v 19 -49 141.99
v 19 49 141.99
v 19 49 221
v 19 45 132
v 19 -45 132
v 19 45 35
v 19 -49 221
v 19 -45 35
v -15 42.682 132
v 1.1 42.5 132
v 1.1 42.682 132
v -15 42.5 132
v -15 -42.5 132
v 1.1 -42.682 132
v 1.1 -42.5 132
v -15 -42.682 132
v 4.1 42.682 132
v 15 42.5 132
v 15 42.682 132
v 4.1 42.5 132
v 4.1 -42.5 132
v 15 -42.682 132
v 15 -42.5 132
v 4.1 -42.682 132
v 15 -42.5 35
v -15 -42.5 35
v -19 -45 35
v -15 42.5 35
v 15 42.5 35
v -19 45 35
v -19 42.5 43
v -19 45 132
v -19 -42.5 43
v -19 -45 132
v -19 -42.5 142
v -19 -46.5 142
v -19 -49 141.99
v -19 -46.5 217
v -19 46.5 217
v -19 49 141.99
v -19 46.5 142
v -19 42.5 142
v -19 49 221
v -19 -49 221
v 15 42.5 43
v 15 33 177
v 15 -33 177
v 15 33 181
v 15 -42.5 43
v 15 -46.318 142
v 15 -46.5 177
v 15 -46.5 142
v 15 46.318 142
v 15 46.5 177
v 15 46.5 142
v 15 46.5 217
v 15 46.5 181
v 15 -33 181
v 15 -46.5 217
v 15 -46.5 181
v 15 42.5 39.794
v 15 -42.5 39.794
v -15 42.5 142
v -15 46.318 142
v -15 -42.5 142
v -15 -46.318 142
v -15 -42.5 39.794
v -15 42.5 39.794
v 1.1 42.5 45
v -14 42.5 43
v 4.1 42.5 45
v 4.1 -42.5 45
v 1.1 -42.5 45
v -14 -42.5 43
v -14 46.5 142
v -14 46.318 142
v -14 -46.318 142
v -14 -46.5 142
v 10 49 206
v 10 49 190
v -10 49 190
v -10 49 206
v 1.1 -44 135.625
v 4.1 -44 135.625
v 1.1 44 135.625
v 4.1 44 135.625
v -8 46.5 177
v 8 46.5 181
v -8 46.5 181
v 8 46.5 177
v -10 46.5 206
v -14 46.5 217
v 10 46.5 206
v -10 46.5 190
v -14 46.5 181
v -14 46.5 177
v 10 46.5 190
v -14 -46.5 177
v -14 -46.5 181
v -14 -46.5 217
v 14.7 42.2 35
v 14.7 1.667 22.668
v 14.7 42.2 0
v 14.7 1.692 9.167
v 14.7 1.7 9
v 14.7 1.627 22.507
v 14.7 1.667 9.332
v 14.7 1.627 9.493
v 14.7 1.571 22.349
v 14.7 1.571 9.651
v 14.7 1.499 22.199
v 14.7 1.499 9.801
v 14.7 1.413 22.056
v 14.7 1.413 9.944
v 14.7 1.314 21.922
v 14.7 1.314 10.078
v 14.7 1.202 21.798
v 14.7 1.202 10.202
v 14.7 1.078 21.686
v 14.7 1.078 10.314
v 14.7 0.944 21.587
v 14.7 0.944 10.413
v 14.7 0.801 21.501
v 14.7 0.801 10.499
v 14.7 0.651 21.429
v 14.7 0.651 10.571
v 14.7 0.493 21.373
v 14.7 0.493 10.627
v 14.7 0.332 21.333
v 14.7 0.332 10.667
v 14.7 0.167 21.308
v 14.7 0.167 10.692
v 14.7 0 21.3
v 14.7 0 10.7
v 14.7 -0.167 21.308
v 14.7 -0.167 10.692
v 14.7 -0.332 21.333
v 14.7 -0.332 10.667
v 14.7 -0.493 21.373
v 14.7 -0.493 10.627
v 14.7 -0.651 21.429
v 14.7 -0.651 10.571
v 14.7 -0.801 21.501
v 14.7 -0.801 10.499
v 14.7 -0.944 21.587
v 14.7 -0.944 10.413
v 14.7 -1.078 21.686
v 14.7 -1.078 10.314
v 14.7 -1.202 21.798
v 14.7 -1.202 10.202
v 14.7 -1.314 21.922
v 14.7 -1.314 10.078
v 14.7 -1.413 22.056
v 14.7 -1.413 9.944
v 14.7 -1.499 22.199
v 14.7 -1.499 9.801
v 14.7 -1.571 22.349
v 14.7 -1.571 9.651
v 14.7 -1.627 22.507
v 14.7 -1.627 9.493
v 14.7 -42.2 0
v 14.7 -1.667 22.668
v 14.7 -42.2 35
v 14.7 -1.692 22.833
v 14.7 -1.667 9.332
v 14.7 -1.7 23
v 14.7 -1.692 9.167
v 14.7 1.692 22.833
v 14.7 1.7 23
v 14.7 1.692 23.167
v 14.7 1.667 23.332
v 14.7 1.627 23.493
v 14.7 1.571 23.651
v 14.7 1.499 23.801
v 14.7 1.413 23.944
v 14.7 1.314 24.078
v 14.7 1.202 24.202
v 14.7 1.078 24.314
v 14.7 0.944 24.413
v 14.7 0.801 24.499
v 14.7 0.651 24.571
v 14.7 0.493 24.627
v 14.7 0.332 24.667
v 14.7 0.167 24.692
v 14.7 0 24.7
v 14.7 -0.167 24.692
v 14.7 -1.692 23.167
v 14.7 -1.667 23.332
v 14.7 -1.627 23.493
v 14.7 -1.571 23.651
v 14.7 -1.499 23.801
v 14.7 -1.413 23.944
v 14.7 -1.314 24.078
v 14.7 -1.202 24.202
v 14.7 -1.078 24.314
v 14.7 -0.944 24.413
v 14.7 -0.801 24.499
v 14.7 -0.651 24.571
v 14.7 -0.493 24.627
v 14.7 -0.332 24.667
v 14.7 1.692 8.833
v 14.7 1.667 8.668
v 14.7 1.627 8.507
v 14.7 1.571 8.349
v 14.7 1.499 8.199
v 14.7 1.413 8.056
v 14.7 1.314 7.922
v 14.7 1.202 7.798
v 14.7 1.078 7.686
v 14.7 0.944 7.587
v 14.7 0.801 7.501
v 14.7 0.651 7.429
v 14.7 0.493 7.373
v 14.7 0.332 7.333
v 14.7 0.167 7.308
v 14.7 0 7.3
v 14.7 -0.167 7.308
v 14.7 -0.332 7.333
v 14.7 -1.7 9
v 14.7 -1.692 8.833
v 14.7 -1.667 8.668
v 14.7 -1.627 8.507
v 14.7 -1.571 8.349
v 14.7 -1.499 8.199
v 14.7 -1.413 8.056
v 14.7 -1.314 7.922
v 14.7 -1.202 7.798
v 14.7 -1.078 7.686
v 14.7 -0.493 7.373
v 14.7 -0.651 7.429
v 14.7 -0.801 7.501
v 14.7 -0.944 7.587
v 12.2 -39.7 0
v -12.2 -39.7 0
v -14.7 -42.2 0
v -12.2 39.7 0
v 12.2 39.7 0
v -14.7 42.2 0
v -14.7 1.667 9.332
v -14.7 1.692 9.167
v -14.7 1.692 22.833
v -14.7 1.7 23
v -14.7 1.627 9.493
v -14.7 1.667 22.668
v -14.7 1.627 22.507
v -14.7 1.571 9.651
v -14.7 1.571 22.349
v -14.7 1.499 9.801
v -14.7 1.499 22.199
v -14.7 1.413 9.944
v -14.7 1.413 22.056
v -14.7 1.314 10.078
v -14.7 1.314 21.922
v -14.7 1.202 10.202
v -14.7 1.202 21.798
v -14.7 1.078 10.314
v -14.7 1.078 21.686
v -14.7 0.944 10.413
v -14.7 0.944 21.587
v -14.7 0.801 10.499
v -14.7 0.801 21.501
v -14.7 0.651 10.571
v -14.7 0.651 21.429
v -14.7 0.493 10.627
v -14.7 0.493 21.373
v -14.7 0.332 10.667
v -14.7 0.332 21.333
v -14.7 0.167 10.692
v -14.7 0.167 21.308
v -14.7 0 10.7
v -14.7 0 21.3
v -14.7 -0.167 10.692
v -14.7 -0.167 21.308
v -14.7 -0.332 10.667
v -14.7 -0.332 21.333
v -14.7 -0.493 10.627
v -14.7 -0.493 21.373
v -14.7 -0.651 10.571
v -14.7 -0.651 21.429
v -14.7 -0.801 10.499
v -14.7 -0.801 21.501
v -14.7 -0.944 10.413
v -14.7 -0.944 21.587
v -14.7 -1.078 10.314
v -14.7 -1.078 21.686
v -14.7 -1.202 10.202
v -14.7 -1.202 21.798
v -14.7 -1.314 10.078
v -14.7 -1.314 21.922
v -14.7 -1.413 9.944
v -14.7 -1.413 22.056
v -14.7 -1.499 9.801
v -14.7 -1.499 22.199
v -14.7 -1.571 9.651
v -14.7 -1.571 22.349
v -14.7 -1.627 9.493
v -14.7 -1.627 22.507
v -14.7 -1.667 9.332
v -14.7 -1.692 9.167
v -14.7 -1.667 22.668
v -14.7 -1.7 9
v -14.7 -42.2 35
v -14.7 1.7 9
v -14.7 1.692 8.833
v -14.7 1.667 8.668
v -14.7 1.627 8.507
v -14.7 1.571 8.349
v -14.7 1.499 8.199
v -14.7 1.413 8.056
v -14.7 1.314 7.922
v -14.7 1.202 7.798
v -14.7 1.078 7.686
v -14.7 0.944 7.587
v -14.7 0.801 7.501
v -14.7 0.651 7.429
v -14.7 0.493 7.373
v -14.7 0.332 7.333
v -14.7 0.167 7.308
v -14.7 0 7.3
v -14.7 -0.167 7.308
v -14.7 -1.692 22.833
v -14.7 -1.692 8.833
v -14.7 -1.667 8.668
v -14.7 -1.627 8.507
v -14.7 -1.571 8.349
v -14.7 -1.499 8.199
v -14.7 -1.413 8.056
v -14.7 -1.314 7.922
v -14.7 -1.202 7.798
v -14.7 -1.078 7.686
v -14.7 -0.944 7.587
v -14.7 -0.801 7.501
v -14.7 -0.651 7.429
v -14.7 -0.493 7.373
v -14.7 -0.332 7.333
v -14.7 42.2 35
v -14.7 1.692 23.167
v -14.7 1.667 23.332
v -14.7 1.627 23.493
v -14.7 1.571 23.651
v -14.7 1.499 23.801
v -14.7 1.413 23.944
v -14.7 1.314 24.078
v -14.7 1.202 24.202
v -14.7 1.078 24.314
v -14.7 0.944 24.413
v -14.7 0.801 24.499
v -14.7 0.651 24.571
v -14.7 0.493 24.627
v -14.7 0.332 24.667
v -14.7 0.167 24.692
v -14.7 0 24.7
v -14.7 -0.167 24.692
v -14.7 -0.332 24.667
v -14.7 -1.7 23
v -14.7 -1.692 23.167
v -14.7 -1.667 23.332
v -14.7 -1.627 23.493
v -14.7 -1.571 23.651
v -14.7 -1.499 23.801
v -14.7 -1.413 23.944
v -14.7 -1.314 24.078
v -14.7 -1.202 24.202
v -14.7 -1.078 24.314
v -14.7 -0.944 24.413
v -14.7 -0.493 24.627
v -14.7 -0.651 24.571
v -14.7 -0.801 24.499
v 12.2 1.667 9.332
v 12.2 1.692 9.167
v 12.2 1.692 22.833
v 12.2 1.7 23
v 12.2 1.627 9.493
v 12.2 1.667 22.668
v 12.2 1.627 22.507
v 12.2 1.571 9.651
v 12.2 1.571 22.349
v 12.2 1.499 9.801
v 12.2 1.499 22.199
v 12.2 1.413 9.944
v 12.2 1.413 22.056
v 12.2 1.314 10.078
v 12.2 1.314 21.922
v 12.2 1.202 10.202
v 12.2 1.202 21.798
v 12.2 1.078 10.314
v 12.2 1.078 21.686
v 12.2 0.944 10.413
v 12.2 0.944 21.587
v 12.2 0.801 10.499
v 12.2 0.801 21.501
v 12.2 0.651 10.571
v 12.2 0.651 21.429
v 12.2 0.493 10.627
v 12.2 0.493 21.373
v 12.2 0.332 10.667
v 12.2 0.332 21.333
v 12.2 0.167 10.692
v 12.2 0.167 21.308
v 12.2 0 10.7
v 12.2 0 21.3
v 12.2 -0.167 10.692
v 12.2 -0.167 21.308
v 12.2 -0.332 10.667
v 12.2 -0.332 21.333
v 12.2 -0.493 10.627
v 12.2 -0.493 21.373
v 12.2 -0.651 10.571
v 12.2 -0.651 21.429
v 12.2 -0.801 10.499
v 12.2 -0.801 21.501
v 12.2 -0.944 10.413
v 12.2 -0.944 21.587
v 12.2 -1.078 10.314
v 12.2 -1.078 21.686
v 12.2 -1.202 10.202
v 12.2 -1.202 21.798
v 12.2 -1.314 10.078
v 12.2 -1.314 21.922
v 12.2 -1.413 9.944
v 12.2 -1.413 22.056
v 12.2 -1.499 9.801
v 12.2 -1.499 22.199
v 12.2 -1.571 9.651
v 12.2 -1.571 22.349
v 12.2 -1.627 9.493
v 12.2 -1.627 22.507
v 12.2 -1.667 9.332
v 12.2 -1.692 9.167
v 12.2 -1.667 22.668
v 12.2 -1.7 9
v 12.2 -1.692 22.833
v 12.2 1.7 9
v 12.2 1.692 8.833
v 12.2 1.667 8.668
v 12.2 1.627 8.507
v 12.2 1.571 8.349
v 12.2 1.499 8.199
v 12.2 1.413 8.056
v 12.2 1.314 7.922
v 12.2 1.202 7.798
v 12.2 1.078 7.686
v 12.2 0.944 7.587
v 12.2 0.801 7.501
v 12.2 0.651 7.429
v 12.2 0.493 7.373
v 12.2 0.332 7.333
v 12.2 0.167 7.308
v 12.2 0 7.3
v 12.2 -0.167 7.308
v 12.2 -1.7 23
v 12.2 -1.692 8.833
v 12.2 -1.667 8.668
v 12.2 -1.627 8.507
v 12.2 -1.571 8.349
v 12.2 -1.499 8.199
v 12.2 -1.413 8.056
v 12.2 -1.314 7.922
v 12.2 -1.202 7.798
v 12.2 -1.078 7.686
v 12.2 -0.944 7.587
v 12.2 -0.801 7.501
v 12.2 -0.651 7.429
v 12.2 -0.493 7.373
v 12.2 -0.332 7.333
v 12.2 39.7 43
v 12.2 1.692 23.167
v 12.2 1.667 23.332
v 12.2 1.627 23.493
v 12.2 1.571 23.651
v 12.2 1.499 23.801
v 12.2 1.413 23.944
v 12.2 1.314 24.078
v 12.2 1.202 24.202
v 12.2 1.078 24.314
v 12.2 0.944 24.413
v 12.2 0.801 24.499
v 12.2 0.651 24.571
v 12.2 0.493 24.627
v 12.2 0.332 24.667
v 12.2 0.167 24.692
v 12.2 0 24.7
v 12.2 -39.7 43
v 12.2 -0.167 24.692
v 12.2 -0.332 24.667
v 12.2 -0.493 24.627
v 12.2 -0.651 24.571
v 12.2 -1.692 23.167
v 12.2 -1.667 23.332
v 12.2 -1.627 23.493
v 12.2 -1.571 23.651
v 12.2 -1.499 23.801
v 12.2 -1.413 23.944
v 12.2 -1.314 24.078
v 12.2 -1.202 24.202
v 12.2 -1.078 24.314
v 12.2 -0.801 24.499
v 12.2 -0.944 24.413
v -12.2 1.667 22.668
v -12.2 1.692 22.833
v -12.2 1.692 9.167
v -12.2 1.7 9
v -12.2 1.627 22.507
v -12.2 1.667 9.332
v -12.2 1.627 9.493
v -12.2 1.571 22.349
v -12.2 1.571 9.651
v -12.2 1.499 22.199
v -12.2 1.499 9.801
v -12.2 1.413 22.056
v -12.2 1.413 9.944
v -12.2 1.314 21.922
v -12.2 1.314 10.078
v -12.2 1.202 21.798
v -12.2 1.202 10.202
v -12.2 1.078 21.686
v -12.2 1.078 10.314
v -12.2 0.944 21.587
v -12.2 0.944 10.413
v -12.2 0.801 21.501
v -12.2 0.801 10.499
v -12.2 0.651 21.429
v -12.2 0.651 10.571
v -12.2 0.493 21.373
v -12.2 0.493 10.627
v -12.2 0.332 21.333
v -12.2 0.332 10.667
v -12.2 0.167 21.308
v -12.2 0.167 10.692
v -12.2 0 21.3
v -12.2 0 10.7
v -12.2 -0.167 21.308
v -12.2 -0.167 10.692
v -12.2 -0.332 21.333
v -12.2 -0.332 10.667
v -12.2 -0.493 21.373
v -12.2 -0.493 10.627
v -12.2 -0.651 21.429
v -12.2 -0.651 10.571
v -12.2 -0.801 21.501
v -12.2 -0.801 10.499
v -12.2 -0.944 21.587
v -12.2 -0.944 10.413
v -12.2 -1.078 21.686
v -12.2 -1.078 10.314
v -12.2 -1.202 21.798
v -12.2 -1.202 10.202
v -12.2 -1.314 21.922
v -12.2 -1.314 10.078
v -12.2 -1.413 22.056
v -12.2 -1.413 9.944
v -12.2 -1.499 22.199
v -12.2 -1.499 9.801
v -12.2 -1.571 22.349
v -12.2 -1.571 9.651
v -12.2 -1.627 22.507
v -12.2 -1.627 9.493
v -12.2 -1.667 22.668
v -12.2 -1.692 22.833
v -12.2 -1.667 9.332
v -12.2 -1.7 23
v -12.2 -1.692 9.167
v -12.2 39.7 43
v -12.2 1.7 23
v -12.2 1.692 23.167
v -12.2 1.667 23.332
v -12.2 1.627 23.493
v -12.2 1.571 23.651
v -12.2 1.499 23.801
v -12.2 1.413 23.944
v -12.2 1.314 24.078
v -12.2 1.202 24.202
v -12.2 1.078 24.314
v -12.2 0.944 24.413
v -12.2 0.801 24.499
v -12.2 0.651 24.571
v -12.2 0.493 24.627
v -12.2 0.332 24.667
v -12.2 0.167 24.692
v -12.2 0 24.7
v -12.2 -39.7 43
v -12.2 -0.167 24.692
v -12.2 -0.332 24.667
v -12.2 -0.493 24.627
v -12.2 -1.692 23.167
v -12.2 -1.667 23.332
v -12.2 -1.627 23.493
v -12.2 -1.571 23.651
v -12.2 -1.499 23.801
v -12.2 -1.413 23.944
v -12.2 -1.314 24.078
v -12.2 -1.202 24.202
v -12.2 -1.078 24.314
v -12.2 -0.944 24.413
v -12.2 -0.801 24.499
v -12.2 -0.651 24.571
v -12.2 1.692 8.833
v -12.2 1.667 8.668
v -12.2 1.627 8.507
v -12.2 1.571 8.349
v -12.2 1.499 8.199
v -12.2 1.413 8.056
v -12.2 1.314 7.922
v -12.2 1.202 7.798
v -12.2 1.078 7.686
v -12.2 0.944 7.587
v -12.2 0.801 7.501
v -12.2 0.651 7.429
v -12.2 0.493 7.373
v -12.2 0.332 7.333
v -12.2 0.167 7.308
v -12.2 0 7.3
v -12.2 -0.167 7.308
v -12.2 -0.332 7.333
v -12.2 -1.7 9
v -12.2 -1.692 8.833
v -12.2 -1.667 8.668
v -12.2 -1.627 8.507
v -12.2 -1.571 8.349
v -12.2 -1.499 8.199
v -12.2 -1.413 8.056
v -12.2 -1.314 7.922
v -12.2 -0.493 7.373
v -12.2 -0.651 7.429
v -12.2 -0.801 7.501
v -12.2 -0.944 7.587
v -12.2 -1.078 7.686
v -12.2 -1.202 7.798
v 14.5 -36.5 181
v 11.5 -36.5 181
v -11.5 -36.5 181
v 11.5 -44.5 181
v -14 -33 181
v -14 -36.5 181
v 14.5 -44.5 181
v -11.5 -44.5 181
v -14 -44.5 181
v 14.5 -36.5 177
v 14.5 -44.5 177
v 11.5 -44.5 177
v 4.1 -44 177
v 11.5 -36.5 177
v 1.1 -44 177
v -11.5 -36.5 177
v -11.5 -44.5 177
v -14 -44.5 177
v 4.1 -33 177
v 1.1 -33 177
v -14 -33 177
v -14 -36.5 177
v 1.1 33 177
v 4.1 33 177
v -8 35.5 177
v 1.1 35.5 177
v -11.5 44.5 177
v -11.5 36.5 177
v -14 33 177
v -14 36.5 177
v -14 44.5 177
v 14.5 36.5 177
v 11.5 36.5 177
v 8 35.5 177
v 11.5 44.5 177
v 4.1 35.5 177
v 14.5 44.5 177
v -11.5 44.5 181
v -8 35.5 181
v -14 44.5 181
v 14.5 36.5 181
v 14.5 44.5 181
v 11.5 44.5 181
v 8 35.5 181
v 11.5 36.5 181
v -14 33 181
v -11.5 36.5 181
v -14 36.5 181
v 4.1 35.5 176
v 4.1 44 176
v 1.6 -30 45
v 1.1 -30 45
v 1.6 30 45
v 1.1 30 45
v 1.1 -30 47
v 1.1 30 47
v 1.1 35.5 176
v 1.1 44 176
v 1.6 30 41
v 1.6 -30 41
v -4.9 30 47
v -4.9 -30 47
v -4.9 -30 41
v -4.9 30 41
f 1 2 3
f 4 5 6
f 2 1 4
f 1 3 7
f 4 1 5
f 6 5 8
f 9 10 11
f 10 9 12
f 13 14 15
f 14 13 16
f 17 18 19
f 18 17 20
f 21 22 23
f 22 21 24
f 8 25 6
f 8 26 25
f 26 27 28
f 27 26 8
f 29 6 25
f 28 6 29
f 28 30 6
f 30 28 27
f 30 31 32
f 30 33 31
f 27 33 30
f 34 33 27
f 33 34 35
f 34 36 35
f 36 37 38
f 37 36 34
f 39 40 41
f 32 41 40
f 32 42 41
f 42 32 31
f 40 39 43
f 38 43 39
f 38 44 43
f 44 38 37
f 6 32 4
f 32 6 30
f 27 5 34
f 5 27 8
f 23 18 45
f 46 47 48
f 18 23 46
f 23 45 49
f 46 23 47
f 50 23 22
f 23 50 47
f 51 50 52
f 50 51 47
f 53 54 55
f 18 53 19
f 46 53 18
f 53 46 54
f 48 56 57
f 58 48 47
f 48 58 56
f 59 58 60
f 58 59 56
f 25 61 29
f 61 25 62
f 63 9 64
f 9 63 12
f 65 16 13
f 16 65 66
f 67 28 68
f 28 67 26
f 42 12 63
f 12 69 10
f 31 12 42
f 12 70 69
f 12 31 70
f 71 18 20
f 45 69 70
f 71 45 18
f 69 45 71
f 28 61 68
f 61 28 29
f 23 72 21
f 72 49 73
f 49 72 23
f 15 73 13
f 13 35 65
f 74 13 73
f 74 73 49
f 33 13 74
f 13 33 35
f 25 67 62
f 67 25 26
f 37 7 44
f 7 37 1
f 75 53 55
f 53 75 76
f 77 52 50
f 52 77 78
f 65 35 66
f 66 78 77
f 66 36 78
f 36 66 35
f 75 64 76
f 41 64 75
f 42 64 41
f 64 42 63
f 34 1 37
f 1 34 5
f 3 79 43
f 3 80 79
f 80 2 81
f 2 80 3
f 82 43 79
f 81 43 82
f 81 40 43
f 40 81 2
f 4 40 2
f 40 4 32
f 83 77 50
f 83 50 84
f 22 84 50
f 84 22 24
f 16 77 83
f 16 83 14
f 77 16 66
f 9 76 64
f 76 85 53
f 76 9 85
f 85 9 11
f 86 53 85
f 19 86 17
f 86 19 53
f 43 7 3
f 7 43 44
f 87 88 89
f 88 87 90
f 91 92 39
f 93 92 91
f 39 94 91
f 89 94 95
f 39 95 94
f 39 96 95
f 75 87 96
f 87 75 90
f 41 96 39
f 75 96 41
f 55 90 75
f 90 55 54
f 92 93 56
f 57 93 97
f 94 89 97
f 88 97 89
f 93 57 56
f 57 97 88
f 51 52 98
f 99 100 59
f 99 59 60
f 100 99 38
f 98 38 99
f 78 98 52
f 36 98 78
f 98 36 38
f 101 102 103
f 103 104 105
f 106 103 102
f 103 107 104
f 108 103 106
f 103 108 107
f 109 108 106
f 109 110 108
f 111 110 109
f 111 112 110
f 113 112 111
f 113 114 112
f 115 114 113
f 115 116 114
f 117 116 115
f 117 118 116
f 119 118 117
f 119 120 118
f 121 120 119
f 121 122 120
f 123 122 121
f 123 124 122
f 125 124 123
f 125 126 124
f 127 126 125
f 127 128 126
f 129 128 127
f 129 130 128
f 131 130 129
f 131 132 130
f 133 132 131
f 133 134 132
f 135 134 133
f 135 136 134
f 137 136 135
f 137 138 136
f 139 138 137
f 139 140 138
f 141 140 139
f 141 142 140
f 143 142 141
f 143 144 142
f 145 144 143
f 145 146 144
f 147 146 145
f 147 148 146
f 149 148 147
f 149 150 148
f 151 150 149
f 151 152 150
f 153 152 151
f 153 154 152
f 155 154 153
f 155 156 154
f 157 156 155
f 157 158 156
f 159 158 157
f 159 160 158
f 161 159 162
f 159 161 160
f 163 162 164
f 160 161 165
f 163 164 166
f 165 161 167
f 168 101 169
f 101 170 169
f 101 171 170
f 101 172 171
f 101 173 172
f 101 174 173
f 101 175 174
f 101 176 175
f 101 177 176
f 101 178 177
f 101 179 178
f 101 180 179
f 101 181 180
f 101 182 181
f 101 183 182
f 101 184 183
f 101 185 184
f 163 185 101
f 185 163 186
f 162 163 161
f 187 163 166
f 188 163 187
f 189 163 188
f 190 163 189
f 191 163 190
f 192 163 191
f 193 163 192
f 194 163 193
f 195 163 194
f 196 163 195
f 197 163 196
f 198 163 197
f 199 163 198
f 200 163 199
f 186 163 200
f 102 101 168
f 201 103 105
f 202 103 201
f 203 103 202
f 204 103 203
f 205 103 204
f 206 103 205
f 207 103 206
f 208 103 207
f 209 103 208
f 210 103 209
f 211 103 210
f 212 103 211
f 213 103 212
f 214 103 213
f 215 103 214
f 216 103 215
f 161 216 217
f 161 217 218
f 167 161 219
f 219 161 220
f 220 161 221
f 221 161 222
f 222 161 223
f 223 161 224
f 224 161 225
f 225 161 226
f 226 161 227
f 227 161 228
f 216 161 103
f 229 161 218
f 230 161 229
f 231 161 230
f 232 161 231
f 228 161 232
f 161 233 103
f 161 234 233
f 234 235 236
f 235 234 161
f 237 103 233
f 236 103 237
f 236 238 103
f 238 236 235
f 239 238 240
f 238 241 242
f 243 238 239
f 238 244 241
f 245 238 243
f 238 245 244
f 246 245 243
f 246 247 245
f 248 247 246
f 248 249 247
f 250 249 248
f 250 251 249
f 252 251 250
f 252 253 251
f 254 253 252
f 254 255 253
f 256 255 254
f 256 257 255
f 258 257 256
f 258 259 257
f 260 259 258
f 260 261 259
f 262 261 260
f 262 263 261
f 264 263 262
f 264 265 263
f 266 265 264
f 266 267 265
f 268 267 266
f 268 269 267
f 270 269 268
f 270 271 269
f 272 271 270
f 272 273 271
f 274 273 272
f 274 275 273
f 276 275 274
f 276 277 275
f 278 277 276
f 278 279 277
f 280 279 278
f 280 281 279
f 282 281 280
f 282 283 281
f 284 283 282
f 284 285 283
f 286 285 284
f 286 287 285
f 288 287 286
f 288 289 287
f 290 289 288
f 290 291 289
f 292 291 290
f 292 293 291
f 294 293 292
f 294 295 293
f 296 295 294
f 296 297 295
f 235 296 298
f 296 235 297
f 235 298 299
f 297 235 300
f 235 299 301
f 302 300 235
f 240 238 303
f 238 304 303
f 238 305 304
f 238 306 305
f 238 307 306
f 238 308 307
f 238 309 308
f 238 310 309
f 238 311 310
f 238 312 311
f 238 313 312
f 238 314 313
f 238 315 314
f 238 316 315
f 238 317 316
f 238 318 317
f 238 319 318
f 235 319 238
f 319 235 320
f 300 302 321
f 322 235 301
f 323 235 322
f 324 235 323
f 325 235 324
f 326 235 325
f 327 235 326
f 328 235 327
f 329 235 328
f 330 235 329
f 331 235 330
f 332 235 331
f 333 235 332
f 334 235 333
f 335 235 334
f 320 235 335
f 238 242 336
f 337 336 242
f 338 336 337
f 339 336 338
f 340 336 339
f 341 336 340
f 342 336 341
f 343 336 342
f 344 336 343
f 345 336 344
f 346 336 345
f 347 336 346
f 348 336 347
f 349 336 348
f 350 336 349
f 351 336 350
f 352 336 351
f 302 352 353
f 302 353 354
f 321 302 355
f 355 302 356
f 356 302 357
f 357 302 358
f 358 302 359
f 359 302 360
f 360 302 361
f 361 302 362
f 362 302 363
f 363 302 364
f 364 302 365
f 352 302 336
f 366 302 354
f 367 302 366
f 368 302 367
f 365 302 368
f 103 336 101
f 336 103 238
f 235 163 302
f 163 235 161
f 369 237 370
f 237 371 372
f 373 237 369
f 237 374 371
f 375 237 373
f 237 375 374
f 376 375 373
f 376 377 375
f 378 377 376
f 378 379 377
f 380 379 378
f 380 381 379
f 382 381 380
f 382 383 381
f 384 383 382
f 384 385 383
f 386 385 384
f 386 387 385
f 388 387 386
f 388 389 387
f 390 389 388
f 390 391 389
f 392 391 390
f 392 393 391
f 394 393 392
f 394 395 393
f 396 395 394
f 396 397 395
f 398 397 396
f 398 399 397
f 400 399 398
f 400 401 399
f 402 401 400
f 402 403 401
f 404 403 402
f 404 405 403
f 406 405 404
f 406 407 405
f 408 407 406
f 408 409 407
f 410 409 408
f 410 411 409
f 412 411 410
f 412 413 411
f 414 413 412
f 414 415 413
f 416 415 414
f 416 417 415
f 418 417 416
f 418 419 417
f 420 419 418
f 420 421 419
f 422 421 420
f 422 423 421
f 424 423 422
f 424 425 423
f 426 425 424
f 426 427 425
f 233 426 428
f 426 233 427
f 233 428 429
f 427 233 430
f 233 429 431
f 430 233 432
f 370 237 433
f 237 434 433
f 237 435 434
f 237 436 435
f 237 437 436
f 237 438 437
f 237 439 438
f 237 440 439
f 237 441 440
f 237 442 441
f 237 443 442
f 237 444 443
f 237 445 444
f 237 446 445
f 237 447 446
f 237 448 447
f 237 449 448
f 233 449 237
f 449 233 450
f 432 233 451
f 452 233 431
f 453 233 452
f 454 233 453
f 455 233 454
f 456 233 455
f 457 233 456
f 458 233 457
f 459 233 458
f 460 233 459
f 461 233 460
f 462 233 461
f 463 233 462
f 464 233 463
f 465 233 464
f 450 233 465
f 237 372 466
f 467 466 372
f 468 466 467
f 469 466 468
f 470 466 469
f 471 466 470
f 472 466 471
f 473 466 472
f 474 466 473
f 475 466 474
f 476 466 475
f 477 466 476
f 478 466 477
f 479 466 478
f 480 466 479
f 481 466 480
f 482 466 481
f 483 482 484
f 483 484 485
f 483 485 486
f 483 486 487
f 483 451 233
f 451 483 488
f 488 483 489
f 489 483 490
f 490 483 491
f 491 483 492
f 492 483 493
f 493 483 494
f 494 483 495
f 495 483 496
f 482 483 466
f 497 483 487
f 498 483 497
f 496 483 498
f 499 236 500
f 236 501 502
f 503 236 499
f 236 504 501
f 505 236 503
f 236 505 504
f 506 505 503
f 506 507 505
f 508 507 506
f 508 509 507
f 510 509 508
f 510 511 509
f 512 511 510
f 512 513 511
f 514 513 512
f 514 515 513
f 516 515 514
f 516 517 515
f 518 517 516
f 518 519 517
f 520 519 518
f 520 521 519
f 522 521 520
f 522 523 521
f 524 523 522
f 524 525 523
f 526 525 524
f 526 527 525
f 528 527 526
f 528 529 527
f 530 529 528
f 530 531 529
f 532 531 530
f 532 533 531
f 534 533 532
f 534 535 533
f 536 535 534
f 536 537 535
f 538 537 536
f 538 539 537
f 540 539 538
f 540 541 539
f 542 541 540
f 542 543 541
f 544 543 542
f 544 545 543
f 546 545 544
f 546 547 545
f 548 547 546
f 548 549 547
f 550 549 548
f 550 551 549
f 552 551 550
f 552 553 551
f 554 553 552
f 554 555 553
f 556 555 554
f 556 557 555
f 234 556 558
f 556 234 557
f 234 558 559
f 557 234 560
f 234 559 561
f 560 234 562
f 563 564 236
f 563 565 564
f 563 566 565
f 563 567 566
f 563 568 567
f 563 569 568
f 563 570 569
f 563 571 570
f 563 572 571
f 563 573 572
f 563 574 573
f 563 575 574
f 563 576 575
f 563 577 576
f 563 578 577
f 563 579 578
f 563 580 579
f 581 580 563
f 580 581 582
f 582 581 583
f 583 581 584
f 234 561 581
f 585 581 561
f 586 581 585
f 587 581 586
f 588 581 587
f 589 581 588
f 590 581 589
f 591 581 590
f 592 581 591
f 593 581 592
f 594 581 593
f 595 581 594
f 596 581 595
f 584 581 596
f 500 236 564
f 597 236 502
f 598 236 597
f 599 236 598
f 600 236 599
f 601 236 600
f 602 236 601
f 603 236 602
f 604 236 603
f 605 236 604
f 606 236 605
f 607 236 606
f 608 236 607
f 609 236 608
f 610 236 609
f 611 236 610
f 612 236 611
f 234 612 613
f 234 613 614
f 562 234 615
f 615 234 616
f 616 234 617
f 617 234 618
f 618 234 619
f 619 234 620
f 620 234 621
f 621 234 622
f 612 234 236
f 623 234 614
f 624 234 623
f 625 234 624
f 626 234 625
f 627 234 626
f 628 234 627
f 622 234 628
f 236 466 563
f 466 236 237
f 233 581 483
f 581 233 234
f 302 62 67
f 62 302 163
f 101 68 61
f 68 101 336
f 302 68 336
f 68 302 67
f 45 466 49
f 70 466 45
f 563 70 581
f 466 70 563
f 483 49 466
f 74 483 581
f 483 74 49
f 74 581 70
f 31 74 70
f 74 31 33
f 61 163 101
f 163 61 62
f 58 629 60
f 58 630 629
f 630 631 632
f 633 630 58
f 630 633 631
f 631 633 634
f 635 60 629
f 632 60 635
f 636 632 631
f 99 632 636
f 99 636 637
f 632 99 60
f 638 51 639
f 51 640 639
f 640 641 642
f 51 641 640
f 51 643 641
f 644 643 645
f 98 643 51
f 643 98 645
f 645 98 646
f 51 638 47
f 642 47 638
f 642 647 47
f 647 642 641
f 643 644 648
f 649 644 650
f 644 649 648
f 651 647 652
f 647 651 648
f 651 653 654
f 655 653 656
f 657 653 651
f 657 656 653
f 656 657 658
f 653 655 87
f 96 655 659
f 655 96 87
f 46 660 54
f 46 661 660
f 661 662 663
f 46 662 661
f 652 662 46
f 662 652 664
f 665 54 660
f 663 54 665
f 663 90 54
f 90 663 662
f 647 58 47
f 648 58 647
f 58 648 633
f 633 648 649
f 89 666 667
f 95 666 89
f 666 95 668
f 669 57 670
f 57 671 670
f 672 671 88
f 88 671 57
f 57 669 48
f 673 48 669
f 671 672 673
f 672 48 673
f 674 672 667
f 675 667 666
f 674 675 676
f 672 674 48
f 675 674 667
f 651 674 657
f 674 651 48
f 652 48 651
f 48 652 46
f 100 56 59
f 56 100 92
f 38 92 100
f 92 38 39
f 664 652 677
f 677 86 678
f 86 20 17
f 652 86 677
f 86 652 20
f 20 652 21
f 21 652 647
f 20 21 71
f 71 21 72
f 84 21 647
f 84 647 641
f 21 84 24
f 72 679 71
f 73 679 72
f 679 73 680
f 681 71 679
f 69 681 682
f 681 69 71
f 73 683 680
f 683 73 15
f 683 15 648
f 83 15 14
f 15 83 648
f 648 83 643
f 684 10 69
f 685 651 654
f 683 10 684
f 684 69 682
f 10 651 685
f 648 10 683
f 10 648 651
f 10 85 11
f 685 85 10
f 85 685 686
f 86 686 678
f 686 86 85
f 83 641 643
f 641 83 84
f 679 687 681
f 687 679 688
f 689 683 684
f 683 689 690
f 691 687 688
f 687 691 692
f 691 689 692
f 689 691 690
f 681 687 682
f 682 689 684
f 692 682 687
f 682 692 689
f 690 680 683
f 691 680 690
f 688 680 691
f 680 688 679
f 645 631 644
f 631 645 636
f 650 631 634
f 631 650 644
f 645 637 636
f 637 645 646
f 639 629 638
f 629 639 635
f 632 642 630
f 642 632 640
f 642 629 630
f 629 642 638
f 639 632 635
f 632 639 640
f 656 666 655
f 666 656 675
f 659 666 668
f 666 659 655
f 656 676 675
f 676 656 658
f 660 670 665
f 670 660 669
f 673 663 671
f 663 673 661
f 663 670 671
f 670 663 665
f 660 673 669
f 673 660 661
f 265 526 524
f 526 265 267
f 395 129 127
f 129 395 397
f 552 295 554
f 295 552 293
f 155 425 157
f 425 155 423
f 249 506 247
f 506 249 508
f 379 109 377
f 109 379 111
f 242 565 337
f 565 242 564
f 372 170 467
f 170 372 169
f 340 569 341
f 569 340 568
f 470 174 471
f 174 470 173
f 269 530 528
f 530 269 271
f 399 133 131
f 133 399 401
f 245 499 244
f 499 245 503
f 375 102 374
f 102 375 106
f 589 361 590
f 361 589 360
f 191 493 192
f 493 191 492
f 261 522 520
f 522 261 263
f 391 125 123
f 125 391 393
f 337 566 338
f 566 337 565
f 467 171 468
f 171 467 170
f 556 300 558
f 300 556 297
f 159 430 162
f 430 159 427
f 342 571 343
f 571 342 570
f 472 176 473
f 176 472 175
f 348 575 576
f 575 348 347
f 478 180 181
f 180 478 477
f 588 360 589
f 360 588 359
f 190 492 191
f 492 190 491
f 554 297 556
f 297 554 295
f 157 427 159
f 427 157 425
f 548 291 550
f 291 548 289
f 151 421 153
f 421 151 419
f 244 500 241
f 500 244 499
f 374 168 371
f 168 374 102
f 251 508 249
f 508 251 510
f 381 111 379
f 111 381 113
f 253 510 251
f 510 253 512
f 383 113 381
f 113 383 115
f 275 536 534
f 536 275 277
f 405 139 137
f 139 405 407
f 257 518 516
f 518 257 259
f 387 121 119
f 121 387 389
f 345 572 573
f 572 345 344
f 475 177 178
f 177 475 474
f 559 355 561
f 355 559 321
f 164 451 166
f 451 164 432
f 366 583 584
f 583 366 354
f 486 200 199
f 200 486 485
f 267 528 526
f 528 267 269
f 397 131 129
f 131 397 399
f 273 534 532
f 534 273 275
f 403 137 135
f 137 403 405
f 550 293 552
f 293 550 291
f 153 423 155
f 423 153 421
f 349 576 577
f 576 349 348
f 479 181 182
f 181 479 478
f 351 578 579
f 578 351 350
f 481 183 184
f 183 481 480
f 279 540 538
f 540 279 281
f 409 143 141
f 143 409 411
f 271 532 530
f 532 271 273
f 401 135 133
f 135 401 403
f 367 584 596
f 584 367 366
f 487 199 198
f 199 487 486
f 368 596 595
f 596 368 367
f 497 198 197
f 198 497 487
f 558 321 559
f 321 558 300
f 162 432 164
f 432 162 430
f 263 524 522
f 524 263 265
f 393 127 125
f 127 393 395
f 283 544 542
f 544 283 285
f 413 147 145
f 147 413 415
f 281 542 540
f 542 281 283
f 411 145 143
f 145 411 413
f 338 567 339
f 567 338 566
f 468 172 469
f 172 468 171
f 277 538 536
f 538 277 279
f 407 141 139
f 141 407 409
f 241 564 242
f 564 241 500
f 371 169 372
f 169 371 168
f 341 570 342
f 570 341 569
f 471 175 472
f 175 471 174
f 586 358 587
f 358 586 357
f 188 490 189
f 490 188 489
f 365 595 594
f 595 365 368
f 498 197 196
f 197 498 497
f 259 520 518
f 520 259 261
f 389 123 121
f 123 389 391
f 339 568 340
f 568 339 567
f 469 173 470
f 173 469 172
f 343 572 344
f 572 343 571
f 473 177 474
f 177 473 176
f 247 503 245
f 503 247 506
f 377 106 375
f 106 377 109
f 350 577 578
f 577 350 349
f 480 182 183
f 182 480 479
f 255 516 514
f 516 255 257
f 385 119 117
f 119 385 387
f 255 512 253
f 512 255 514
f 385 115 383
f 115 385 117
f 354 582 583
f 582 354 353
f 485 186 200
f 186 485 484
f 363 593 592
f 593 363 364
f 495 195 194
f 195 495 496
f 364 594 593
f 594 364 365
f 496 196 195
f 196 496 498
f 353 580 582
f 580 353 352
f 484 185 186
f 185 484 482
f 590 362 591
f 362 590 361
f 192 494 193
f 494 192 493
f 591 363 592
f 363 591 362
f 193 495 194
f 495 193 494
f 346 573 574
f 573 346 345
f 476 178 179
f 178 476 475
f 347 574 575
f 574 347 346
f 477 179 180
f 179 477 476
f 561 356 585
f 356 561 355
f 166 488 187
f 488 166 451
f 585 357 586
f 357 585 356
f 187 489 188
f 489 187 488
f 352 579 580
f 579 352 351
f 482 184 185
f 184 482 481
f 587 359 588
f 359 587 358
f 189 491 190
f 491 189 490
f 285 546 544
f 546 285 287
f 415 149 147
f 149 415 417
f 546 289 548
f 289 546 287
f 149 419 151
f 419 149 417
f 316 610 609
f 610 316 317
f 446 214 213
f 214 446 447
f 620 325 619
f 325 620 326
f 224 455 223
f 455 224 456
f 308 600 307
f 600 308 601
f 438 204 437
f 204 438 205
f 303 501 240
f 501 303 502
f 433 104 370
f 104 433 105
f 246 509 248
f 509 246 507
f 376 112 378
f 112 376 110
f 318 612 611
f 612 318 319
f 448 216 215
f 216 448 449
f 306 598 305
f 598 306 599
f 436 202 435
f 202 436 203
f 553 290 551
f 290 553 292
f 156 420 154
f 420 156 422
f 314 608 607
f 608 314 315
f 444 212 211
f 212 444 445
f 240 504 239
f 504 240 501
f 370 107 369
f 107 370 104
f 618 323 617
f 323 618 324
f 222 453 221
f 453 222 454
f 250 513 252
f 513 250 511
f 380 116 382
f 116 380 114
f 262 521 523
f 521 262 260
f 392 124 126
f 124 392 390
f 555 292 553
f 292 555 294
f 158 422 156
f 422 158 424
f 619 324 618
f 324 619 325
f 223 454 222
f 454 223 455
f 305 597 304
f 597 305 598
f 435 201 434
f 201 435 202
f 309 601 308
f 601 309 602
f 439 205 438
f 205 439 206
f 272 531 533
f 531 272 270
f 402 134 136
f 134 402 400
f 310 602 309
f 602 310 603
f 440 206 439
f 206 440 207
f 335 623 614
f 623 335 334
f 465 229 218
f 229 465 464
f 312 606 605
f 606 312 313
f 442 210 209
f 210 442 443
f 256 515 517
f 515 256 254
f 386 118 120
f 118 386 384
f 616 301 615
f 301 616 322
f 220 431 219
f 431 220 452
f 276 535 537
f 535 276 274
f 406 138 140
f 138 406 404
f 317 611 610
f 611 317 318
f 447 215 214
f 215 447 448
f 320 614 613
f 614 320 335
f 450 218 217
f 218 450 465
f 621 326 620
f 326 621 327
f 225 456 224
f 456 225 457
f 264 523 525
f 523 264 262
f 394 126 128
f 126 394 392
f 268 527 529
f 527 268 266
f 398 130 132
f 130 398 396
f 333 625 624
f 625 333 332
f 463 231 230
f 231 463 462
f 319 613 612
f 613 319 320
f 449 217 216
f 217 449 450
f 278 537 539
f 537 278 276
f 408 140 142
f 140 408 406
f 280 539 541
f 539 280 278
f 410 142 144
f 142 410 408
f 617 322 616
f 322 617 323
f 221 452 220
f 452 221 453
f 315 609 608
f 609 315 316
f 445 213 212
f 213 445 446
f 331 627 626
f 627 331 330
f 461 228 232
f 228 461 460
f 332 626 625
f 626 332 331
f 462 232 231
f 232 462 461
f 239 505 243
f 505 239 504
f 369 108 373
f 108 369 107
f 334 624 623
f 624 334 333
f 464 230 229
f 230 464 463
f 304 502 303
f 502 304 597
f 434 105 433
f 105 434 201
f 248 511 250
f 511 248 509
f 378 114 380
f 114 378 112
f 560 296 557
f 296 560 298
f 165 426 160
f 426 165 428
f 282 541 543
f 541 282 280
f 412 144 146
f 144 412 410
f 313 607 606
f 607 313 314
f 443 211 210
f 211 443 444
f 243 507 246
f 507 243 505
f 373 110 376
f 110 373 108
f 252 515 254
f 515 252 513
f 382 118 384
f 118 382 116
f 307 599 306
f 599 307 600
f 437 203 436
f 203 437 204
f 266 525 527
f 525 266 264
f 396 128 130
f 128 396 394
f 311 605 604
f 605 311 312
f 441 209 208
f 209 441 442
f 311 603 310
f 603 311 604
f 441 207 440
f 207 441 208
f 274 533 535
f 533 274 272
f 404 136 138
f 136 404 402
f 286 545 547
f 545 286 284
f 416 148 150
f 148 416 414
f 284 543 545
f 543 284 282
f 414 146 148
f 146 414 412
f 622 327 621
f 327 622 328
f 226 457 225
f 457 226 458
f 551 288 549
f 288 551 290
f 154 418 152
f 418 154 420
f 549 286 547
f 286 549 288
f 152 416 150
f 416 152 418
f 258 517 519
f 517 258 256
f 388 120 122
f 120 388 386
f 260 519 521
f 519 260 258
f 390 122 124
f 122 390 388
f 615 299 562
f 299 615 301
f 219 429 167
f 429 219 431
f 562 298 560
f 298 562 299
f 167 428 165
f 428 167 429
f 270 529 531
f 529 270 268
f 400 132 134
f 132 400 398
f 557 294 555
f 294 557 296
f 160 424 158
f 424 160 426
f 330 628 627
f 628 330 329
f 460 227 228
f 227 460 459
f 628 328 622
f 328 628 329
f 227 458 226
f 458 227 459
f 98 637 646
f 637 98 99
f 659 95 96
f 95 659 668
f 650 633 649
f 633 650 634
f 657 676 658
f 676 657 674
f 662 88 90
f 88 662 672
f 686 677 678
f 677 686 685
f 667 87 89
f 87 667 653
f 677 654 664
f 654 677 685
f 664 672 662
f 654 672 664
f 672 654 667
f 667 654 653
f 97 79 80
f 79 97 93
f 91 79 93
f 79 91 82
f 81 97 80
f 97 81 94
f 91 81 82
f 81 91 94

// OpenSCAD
// Standalone robot upper body B piece (upper_bodyB v5.5) - A/B-final
// equipment bay, DOOR RETIRED. Changes vs v5.4 (2026-07-25):
//   - X-ONLY OPEN FACE (CoM request): v5.4's three-side bay (X- wall
//     + both Y-wall front strips removed) pushed the shell CoM to
//     x +7.4 mm behind the swing centerline. Both Y walls are
//     RESTORED to full section; only the X- face is open, at the
//     v5.3 full interior width (no lips): opening 85 in the 90 zone
//     (vs the 75 board), 93 in the head. Shell CoM moves back toward
//     center and the closed box section (Y walls + X+ wall +
//     bulkhead) is fully restored. Accepted trade-off: in-plane edge
//     plugs on the board's Y edges approach at an angle through the
//     wide front opening instead of straight along Y.
//   - SIDE-RAIL SHELF: the full battery shelf plate is replaced by
//     two 15 mm side rails welded into the Y walls; the whole middle
//     (66 wide) is OPEN. That opening is the SWITCH BAY - the power
//     toggle sits there (front-edge toggle slot RETIRED), reached
//     from the front - and a straight wiring drop from the battery
//     to the board top edge (25 mm cable room). The 84 mm pack lies
//     across Y on both rails (Y- end butted on the head wall, Y+ end
//     next to the lead bay); straps move onto the rails, one slot
//     pair per rail (slot length 16 -> 8).
//   - Unchanged: overall height (robot_l2 372, piece ~221 tall),
//     ocr_center_z / ELL_IMU, tape pad + bottom ledge mount, closed
//     telescoping sleeve splice, charge window, T-plug pass.
// Print UPRIGHT as placed, sleeve down (~221 tall - fits X1C 256 with
// margin); the shelf rails bridge ~30 mm across X - allow bridging or
// a little support through the open face.
// Edit shared dimensions in frame_master.scad so the assembly stays linked.

part_mode = "upper_body_b";
part_cutaway = false;     // true removes a corner quarter: bulkhead, tape
                          // pad, seating ledge and shelf rails visible.
                          // Set back to false before exporting the STL!
print_export = true;      // use high quality $fn for STL export

include <frame_master.scad>
